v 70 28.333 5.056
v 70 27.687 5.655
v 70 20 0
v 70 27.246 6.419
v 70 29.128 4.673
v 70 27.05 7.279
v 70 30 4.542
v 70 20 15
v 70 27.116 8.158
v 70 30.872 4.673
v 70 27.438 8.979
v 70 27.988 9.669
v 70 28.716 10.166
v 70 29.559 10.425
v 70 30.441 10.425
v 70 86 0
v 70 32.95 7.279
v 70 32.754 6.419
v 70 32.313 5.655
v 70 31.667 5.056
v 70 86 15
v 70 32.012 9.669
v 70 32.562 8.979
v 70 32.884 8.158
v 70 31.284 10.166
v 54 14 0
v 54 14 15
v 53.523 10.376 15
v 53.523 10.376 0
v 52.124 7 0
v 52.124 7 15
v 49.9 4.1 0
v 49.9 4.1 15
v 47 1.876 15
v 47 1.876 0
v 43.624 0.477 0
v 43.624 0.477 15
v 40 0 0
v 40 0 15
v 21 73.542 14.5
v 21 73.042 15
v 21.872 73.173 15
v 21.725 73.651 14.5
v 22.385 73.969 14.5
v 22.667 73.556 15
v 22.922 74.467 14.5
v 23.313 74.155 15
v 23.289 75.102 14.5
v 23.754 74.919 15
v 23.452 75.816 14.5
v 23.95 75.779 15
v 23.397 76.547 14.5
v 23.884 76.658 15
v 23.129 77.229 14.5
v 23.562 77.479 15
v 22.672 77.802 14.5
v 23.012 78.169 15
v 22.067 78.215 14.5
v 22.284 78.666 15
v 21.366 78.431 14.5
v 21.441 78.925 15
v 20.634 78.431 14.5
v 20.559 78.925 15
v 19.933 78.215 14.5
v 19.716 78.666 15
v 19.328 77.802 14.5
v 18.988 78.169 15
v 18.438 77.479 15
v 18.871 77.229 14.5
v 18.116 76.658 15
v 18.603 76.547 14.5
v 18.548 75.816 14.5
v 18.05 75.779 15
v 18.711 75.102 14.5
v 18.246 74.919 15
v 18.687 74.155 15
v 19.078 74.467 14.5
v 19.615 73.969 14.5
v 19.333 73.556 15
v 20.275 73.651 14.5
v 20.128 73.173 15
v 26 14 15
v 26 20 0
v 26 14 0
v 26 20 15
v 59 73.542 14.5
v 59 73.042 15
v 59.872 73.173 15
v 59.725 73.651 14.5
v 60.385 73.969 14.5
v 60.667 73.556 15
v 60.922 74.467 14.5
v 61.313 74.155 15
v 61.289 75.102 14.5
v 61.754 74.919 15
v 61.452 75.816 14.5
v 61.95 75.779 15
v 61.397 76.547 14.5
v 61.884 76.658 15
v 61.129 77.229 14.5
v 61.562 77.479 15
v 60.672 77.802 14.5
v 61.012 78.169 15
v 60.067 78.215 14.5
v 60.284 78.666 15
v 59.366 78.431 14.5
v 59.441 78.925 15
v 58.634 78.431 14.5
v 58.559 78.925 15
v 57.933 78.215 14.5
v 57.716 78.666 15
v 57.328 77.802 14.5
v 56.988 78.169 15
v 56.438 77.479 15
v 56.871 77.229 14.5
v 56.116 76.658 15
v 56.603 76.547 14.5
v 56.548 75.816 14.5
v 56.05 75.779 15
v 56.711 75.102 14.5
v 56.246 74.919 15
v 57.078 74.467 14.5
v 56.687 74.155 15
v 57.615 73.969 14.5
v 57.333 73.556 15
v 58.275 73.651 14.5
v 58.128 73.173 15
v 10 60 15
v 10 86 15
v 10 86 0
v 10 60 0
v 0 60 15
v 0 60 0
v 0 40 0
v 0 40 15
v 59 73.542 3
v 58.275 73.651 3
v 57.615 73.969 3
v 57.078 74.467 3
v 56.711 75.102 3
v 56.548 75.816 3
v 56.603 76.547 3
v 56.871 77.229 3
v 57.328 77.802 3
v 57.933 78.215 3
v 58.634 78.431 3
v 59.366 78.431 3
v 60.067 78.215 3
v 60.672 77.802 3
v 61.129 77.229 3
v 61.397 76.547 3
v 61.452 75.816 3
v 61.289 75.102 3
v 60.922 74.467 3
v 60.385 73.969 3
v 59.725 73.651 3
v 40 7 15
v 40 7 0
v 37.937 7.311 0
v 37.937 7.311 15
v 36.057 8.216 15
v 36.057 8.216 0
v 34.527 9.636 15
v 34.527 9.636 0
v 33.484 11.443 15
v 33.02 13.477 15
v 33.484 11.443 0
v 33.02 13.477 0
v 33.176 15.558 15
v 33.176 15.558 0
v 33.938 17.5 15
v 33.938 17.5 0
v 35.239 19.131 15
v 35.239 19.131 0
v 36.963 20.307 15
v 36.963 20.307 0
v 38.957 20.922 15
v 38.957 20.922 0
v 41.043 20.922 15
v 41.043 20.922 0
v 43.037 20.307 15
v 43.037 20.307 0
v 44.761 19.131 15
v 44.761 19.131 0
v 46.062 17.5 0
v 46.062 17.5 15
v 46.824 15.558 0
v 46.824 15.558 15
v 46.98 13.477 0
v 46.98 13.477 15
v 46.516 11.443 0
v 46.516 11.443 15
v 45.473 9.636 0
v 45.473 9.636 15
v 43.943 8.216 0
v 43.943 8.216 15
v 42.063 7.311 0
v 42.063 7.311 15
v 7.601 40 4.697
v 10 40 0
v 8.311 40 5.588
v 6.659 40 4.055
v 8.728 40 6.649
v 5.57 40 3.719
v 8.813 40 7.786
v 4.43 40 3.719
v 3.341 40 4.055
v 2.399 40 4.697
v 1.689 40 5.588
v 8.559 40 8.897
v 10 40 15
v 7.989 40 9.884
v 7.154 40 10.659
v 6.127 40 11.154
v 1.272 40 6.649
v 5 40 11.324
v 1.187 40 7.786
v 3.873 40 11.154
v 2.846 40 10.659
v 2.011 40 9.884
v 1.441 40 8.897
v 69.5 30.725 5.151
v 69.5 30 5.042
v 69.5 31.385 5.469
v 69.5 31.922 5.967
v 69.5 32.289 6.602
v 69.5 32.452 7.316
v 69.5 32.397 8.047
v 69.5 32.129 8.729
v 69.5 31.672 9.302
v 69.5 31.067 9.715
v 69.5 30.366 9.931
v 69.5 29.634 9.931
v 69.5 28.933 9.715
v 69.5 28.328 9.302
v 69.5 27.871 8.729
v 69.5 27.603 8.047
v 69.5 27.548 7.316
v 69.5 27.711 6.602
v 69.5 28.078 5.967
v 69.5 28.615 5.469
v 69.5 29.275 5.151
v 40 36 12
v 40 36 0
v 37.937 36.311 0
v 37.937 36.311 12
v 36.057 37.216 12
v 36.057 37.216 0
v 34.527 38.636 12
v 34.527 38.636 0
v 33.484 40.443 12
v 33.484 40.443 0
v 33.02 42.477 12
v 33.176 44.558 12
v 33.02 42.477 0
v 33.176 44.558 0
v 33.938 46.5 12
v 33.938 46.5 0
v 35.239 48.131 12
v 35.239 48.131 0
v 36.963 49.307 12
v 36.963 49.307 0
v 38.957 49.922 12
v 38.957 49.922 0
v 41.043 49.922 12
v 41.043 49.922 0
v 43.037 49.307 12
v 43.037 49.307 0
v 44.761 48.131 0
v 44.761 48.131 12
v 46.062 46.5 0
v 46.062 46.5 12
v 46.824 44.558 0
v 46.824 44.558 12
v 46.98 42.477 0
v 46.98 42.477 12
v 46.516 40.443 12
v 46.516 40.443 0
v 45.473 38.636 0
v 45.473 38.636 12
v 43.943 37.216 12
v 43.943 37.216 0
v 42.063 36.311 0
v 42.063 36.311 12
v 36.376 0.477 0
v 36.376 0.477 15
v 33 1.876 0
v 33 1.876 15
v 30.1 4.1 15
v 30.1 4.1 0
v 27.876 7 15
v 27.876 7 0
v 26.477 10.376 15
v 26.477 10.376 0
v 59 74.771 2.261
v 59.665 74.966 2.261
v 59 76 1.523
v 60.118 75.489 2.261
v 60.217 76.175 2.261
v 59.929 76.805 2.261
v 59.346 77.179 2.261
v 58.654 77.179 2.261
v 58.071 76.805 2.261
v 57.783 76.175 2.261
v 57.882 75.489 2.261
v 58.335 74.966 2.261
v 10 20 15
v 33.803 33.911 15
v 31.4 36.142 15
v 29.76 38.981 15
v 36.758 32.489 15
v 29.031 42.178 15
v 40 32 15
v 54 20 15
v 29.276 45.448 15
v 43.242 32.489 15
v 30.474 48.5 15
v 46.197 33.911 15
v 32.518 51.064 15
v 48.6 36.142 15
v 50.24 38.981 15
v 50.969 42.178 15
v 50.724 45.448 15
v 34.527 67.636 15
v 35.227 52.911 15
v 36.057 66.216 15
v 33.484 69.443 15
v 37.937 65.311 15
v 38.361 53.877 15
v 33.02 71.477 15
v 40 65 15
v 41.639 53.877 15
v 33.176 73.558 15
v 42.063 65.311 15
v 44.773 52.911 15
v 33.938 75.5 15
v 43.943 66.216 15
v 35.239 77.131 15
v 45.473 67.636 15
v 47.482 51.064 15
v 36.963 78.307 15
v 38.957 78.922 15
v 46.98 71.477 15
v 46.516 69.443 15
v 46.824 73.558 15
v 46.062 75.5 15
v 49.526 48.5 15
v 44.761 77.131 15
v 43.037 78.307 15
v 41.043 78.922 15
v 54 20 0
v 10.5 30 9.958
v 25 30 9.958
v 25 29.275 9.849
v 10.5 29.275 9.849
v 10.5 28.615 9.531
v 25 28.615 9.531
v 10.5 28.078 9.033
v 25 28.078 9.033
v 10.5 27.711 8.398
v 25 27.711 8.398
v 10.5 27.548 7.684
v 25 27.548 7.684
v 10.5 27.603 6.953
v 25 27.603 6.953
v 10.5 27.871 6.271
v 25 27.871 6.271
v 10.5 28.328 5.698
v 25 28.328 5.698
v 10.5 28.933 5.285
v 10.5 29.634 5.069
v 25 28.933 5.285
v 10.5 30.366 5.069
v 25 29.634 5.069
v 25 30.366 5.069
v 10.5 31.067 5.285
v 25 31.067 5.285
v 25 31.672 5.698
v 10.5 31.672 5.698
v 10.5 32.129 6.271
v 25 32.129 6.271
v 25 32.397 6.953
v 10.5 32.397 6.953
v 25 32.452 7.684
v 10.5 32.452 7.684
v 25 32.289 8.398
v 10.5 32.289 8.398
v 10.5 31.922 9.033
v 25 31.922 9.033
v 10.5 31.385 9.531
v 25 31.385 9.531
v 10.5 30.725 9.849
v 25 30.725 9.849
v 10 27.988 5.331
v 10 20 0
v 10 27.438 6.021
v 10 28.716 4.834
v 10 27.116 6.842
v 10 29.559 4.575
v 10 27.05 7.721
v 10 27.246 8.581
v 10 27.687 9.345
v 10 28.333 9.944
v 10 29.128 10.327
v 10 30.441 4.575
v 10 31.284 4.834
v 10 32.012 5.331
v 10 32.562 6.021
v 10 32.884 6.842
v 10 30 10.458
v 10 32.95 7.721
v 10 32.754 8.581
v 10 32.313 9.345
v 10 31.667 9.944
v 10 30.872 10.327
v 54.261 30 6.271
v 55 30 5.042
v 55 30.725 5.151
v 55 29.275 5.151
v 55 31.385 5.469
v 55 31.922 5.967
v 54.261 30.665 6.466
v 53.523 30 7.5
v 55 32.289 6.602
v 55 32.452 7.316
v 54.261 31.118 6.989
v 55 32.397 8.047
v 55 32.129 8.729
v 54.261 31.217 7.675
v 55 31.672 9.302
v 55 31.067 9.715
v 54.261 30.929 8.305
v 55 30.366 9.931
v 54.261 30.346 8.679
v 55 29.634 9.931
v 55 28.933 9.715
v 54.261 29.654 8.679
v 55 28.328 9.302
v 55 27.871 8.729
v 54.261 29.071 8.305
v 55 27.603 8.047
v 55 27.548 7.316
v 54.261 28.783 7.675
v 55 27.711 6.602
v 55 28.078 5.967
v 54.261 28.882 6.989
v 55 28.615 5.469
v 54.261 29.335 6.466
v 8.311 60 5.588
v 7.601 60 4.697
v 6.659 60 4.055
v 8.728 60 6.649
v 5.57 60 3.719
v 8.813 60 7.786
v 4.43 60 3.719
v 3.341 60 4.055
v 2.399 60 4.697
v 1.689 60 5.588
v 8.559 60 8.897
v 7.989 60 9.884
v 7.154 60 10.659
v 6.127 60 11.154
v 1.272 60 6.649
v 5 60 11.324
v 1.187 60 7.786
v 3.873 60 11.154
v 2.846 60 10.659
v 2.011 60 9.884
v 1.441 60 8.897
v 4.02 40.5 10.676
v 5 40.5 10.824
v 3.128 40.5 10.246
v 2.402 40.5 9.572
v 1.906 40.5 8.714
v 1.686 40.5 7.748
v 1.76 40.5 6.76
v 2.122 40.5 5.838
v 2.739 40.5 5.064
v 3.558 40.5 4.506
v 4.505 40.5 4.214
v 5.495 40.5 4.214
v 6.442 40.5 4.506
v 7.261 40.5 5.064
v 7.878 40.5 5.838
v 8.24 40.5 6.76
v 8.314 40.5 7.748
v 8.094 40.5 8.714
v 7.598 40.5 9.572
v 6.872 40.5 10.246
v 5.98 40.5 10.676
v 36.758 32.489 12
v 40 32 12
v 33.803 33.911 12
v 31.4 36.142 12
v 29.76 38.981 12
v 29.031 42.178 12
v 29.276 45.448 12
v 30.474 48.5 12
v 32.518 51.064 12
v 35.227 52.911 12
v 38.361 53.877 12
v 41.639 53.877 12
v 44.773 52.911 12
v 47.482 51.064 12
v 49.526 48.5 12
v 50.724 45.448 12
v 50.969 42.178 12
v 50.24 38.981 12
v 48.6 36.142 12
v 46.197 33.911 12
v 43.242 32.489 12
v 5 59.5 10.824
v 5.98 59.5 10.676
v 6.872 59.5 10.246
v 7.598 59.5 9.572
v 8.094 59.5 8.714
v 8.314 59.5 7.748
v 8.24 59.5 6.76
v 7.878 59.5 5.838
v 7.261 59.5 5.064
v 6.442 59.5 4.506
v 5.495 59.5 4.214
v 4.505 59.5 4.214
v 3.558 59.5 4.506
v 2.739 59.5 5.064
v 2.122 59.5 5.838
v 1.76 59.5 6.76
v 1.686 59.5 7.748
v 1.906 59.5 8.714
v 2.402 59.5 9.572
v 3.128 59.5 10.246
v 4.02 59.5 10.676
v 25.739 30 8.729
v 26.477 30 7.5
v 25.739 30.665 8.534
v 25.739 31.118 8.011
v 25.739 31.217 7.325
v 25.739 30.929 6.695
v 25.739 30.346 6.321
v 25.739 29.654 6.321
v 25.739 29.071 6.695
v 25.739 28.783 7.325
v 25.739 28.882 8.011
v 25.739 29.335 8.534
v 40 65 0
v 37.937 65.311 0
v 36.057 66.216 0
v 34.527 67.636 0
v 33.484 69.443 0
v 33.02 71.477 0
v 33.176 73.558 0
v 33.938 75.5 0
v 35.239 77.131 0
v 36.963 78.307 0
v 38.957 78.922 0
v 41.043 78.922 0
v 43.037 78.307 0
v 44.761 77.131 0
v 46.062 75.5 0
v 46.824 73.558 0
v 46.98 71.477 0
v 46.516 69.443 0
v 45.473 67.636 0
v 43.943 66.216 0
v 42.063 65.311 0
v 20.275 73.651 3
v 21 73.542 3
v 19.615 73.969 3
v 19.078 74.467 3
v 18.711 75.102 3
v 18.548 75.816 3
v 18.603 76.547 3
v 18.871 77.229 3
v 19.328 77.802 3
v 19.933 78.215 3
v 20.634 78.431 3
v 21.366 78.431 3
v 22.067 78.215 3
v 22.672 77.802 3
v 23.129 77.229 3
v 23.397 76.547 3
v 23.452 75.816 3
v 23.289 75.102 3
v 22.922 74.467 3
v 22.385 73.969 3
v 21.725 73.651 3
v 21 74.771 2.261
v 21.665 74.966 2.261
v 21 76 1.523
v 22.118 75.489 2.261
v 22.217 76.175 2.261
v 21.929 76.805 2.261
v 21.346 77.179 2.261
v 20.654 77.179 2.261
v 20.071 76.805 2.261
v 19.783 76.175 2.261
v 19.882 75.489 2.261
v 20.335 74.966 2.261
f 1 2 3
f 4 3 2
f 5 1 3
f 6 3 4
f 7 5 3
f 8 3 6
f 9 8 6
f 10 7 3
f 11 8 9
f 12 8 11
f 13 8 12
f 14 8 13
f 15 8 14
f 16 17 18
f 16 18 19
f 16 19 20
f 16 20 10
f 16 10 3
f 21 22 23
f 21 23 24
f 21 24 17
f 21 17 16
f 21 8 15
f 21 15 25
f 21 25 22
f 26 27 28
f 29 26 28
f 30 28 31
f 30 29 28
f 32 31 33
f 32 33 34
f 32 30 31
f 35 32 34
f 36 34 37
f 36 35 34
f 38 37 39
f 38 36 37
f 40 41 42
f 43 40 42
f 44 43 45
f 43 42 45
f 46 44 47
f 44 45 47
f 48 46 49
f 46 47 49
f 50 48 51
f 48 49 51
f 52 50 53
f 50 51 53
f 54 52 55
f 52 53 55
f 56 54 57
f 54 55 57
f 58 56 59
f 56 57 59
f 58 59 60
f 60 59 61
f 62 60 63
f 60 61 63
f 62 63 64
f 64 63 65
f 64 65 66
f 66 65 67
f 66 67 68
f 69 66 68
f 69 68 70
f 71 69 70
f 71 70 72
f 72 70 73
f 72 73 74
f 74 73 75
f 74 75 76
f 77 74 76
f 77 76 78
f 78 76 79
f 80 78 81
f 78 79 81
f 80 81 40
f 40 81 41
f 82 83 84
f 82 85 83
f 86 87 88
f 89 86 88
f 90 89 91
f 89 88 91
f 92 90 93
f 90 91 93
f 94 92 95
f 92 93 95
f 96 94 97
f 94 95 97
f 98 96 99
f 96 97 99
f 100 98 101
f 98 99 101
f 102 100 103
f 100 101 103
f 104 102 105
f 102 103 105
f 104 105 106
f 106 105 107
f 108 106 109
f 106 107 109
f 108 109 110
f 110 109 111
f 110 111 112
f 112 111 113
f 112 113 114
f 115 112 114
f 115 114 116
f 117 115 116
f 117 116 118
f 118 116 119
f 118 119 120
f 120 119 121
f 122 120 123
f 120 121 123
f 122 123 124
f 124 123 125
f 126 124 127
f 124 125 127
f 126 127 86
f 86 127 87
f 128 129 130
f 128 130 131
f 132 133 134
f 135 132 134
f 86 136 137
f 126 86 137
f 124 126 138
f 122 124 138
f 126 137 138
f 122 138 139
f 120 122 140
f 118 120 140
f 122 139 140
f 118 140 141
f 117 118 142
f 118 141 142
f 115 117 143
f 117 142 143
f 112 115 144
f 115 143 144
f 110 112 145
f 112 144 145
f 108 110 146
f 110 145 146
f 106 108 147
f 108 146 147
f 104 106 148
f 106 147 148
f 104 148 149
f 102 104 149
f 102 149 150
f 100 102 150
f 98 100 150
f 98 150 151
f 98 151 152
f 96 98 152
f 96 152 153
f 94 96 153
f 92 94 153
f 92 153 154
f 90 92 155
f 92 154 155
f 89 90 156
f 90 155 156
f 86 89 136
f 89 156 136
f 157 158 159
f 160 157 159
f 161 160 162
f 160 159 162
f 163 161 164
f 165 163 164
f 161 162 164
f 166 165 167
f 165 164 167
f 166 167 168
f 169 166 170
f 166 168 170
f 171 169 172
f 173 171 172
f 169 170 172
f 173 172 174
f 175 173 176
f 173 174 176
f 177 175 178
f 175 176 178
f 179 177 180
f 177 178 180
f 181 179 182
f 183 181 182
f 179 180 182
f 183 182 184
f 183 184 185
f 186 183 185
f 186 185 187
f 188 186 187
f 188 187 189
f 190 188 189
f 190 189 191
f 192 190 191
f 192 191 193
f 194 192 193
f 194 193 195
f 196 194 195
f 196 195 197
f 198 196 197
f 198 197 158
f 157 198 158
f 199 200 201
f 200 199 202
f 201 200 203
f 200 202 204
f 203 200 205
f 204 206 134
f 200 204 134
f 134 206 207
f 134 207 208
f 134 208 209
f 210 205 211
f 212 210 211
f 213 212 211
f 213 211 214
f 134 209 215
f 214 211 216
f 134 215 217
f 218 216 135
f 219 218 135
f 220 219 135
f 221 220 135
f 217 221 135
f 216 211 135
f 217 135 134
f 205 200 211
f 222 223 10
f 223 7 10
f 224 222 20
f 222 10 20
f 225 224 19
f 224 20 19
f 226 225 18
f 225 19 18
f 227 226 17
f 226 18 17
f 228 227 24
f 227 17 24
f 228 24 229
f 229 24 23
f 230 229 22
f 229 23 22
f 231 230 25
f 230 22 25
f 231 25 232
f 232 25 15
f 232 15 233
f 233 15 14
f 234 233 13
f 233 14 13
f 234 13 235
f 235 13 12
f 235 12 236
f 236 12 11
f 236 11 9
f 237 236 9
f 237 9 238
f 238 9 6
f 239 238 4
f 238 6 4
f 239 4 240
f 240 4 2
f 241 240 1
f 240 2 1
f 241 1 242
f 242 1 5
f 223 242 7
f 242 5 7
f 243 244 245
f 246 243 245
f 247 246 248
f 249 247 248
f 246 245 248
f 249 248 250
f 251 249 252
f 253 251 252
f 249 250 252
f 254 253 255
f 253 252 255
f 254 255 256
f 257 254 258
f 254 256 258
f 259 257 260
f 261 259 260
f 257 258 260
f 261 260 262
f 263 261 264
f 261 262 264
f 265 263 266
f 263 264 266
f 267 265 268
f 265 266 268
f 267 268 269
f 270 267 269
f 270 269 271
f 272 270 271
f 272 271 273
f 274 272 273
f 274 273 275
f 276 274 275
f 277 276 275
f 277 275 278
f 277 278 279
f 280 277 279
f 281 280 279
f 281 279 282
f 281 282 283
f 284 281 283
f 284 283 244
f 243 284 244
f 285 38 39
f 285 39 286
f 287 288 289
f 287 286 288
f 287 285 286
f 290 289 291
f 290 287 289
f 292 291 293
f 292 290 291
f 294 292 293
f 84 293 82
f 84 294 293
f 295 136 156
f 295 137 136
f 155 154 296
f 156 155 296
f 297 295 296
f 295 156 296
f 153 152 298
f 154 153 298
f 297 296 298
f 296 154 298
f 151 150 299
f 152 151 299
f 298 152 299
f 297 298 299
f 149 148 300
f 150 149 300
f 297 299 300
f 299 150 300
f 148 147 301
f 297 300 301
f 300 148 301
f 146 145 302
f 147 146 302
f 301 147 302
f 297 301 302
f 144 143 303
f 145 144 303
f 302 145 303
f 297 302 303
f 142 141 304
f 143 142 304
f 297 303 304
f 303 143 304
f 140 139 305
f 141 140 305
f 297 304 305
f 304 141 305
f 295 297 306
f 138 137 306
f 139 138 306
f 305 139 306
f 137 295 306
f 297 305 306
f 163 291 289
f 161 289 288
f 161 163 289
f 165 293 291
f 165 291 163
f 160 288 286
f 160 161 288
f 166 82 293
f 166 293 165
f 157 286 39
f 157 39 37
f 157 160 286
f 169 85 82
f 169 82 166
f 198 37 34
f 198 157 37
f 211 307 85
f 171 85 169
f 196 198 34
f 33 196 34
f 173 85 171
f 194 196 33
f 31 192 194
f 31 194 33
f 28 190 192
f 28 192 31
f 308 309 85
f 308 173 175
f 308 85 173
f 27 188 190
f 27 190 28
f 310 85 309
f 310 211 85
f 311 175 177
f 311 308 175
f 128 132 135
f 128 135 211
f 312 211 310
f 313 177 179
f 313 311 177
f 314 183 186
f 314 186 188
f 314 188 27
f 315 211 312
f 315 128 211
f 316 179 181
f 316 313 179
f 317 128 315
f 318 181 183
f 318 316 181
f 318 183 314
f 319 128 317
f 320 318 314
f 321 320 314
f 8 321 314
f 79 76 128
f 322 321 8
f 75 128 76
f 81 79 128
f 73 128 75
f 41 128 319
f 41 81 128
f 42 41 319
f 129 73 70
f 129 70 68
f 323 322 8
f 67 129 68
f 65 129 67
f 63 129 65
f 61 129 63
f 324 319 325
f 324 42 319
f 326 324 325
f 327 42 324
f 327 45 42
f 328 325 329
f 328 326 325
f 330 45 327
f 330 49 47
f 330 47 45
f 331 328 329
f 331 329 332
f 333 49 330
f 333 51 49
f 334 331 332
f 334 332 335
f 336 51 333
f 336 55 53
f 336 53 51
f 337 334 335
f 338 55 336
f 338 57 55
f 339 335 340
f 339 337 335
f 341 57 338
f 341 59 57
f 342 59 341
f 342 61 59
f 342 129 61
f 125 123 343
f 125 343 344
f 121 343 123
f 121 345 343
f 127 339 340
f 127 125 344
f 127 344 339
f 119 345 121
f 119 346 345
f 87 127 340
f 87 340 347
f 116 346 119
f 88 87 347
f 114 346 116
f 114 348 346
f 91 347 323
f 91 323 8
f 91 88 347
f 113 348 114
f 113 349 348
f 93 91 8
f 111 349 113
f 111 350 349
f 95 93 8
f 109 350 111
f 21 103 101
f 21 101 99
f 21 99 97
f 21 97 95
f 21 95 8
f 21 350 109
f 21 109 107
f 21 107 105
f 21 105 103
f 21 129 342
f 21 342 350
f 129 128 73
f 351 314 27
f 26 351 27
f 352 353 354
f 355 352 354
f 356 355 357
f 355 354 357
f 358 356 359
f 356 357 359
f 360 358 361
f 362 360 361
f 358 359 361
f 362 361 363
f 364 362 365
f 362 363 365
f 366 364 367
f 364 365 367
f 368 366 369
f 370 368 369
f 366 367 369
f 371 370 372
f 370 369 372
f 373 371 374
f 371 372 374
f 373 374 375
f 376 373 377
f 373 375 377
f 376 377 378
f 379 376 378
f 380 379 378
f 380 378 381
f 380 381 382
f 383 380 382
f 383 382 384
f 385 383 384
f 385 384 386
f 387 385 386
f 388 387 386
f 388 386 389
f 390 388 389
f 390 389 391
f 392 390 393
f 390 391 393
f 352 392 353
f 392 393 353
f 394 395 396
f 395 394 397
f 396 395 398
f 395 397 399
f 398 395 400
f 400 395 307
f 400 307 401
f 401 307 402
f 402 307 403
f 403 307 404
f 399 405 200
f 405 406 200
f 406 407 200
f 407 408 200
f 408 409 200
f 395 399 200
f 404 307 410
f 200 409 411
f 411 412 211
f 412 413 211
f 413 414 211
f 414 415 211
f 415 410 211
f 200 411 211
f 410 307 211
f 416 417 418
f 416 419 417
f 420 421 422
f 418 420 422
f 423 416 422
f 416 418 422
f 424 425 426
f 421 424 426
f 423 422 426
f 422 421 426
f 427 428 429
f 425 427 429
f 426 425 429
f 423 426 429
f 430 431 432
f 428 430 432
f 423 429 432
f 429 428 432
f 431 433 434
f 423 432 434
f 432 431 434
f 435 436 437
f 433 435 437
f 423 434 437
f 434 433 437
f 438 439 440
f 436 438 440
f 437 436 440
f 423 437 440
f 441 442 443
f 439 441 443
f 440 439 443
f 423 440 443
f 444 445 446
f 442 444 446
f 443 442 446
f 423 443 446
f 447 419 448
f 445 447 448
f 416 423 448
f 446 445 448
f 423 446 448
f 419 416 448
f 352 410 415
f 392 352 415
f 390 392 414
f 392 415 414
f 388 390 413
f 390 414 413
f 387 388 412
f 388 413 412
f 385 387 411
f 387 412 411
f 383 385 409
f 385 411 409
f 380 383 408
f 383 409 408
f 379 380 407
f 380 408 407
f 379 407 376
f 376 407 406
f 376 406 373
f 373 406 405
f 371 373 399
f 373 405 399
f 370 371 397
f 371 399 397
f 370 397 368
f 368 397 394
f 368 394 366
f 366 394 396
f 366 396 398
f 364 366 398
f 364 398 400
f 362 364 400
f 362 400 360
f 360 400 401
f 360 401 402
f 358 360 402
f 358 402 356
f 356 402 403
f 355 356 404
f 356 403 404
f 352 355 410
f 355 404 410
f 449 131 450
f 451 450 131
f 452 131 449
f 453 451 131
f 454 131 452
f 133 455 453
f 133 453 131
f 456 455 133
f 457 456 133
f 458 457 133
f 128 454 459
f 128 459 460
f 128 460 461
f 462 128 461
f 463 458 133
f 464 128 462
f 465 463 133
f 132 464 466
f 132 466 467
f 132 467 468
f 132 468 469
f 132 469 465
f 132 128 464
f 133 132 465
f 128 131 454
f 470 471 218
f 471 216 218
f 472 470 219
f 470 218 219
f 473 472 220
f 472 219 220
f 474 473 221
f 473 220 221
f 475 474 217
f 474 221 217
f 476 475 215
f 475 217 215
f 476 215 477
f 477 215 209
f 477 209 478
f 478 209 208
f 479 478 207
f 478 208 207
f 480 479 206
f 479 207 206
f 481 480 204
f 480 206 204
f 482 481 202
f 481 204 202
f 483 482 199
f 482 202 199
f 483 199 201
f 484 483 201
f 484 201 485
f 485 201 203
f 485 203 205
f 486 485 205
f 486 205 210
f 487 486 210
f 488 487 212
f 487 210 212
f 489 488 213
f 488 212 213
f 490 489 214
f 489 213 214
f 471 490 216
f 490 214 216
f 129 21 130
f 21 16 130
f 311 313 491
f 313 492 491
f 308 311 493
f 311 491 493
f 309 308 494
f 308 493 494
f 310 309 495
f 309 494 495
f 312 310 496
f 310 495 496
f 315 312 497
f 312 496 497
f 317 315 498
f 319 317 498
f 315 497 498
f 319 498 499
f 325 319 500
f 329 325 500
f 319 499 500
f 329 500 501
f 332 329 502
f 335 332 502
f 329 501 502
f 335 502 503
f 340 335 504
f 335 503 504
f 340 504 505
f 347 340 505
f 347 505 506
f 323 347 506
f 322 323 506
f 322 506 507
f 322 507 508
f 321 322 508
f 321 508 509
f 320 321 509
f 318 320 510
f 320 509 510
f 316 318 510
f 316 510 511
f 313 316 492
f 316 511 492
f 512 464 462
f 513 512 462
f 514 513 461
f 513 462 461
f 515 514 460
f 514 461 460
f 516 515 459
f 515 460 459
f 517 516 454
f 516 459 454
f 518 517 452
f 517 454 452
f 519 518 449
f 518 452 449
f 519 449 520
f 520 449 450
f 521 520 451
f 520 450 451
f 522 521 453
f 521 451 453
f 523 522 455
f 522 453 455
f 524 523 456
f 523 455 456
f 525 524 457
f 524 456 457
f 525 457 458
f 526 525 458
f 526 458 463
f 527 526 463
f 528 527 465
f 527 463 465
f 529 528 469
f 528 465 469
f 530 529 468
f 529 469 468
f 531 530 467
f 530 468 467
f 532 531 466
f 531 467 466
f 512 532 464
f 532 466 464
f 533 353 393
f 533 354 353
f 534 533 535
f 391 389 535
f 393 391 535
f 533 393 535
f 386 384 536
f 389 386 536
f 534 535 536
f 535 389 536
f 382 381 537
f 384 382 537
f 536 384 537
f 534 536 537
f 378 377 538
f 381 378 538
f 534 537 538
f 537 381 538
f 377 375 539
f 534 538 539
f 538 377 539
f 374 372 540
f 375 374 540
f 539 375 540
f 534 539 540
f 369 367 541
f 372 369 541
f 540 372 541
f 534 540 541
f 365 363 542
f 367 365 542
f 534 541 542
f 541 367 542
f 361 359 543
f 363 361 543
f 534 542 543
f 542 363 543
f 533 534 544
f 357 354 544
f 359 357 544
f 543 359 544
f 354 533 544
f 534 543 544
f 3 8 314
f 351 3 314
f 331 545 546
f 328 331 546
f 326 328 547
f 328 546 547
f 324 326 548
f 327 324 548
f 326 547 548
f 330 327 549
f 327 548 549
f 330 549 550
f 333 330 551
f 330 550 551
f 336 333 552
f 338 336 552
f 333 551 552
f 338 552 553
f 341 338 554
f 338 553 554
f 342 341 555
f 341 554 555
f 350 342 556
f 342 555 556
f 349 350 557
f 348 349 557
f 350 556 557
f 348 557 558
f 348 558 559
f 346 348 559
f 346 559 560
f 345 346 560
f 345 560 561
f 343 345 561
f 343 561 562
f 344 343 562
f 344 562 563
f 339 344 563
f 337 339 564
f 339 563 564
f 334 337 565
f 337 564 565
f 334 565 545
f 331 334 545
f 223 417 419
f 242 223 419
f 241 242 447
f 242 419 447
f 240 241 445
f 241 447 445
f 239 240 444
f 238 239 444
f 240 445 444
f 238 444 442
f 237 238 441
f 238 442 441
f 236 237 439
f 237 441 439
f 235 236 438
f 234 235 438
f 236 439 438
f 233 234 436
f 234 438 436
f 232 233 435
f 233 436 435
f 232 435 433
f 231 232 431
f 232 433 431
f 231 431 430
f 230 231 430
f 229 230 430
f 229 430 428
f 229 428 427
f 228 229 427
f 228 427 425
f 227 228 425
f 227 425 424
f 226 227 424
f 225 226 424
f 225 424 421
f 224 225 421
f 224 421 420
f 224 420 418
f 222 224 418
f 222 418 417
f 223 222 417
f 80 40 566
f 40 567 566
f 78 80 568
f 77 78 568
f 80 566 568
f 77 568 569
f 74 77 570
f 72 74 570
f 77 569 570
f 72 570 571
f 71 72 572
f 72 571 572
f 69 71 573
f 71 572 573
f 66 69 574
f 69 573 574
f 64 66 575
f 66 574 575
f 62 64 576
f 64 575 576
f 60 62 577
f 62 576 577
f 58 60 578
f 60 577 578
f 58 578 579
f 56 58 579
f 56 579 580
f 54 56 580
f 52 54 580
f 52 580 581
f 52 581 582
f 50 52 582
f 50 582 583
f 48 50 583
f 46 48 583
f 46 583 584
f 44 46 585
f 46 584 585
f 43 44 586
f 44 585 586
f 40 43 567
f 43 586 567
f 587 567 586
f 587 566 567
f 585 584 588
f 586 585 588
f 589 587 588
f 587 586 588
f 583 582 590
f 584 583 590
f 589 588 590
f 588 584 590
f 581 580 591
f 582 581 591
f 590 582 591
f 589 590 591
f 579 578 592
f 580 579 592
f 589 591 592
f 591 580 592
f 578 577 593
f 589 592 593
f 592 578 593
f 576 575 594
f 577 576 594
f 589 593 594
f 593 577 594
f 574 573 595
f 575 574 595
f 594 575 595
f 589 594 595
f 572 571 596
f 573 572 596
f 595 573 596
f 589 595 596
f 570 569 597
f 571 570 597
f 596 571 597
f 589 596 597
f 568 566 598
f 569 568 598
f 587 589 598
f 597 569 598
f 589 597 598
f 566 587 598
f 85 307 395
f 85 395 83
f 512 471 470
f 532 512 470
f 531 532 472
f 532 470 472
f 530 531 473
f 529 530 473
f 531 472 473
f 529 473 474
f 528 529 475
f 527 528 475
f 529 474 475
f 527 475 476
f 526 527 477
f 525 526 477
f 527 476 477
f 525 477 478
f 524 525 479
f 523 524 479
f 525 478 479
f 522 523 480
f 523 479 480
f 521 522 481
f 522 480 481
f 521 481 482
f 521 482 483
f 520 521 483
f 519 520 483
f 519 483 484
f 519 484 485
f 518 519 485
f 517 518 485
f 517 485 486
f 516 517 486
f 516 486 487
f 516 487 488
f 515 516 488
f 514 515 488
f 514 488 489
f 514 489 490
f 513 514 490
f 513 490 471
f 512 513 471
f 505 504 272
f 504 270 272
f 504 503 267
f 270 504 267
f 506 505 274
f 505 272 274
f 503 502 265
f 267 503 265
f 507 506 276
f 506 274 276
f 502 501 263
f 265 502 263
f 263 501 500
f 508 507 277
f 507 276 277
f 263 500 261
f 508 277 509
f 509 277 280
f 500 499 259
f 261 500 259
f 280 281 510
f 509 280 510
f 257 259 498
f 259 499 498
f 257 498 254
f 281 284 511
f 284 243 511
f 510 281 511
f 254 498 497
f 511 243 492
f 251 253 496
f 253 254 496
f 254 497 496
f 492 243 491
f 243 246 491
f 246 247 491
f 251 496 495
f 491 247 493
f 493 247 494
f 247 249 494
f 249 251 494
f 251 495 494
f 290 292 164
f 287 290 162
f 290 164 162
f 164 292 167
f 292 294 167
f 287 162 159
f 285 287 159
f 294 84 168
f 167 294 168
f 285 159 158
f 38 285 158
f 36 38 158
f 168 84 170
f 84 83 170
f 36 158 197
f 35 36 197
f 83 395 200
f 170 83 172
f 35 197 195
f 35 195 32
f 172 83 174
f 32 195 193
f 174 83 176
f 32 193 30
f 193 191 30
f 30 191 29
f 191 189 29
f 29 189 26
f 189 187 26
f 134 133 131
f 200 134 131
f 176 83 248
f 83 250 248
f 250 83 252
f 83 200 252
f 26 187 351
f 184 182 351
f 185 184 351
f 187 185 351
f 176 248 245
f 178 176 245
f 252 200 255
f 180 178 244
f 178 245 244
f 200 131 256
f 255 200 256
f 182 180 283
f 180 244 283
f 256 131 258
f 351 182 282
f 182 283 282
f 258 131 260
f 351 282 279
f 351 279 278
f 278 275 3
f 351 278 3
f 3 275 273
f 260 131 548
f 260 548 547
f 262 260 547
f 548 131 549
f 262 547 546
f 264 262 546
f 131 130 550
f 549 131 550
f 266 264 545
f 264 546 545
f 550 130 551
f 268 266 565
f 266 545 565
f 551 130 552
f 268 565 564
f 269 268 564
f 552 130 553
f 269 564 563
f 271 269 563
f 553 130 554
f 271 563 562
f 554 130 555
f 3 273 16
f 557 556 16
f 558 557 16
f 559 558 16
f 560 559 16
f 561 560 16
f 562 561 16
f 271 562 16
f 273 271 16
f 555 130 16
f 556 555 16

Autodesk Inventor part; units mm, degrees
ref_plane "YZ Plane" through (0, 0, 0) normal (1, 0, 0) x (0, 1, 0)
ref_plane "XZ Plane" through (0, 0, 0) normal (0, 1, 0) x (-1, 0, 0)
ref_plane "XY Plane" through (0, 0, 0) normal (0, 0, 1) x (1, 0, 0)
sketch "Sketch1" plane through (0, 0, 0) normal (0, 0, 1) x (1, 0, 0)
  line L0 (0, 0) -> (80, 0)
  line L1 (80, 0) -> (80, 86)
  line L2 (80, 86) -> (0, 86)
  line L3 (0, 86) -> (0, 0)
  dimension "d0" = 80
  dimension "d1" = 86
extrude "Extrusion1" add sketch "Sketch1" along normal blind 15
sketch "Sketch2" plane through (0, 0, 15) normal (0, 0, 1) x (1, 0, 0)
  line L0 (0, 0) -> (0, 86) projected
  line L1 (80, 0) -> (0, 0) projected
  line L2 (80, 86) -> (80, 0) projected
  line L3 (0, 86) -> (80, 86) projected
  line L4 (0, 86) -> (10, 86)
  line L5 (10, 86) -> (10, 60)
  line L6 (10, 60) -> (0, 60)
  line L7 (0, 60) -> (0, 86)
  line L8 (70, 86) -> (80, 86)
  line L9 (80, 86) -> (80, 40)
  line L10 (80, 40) -> (70, 40)
  line L11 (70, 40) -> (70, 86)
  line L12 (54, 0) -> (80, 0)
  line L13 (80, 0) -> (80, 20)
  line L14 (80, 20) -> (54, 20)
  line L15 (54, 20) -> (54, 0)
  line L16 (0, 20) -> (26, 20)
  line L17 (26, 20) -> (26, 0)
  line L18 (26, 0) -> (0, 0)
  line L19 (0, 0) -> (0, 20)
  dimension "d4" = 20
  dimension "d5" = 20
  dimension "d6" = 20
  dimension "d7" = 10
  dimension "d8" = 10
  dimension "d9" = 40
  dimension "d10" = 28
  dimension "d11" = 26
extrude "Extrusion2" cut sketch "Sketch2" against normal blind 15 contours L0 L16 L17 L1 | L0 L3 L5 L6 | L15 L14 L2 L1 | L3 L2 L10 L11
sketch "Sketch3" plane through (0, 0, 15) normal (0, 0, 1) x (1, 0, 0)
  line L0 (10, 86) -> (10, 60) projected
  line L1 (10, 60) -> (0, 60) projected
  line L2 (0, 20) -> (0, 60) projected
  line L3 (0, 20) -> (26, 20) projected
  line L4 (26, 20) -> (26, 0) projected
  line L5 (54, 0) -> (26, 0) projected
  line L6 (54, 0) -> (54, 20) projected
  line L7 (54, 20) -> (80, 20) projected
  line L8 (80, 40) -> (80, 20) projected
  line L9 (80, 40) -> (70, 40) projected
  line L10 (70, 40) -> (70, 86) projected
  line L11 (10, 86) -> (70, 86) projected
  line L12 (0, 20) -> (10, 20)
  line L13 (10, 20) -> (10, 40)
  line L14 (10, 40) -> (0, 40)
  line L15 (0, 40) -> (0, 20)
  point P0 (0, 0)
  dimension "d14" = 10
  dimension "d15" = 20
extrude "Extrusion3" cut sketch "Sketch3" against normal blind 15 contours L14 L13 L3 L2
sketch "Sketch4" plane through (0, 0, 15) normal (0, 0, 1) x (1, 0, 0)
  line L0 (26, 20) -> (26, 0) projected
  line L1 (54, 0) -> (26, 0) projected
  line L2 (10, 86) -> (70, 86) projected
  line L3 (0, 40) -> (0, 60) projected
  point P0 (0, 0)
  point P1 (40, 72)
  point P2 (40, 14)
  dimension "d18" = 14
  dimension "d19" = 40
  dimension "d20" = 14
  dimension "d21" = 14
hole "Hole1" at (40, 72, 15) at (40, 14, 15) direction (0, 0, -1) diameter 14 depth 15 tip angle 118
sketch "Sketch5" plane through (0, 0, 15) normal (0, 0, 1) x (1, 0, 0)
  circle A0 centre (40, 72) radius 7 projected
  line L0 (0, 40) -> (0, 60) projected
  point P0 (0, 0)
  point P1 (40, 43)
  dimension "d29" = 29
  dimension "d30" = 40
hole "Hole2" at (40, 43, 15) direction (0, 0, -1) diameter 14 depth 18 tip angle 118 counterbore diameter 22 counterbore depth 3
fillet "Fillet1" radius 14 2 edges at (26, 0, 7.5) (54, 0, 7.5)
sketch "Sketch6" plane through (0, 0, 15) normal (0, 0, 1) x (1, 0, 0)
  line L0 (70, 40) -> (80, 40)
  line L1 (80, 40) -> (80, 20)
  line L2 (80, 20) -> (70, 20)
  line L3 (70, 20) -> (70, 40)
  point P0 (0, 0)
extrude "Extrusion4" cut sketch "Sketch6" against normal blind 15
sketch "Sketch7" plane through (0, 60, 15) normal (0, 1, 0) x (1, 0, 0)
  line L0 (0, 15) -> (10, 15) projected
  line L1 (10, 0) -> (10, 15) projected
  point P0 (5, 7.5)
  dimension "d41" = 7.5
  dimension "d42" = 5
hole "Hole3" at (5, 60, 7.5) direction (0, -1, 0) diameter 6.647 depth 20 tip angle 118 thread size "M8x1.25" class "6H" standard "ANSI Metric M Profile"
chamfer "Chamfer1" distance 0.5 angle 45 2 edges at (5, 60, 4.1765) (5, 40, 4.1765)
sketch "Sketch8" plane through (0, 0, 15) normal (0, 0, 1) x (1, 0, 0)
  circle A0 centre (40, 72) radius 7 projected
  line L0 (10, 86) -> (70, 86) projected
  point P0 (0, 0)
  point P1 (21, 76)
  point P2 (59, 76)
  dimension "d53" = 38
  dimension "d54" = 19
  dimension "d55" = 10
hole "Hole4" at (21, 76, 15) at (59, 76, 15) direction (0, 0, -1) diameter 4.917 depth 12 tip angle 118 thread size "M6x1" class "6H" standard "ANSI Metric M Profile"
chamfer "Chamfer2" distance 0.5 angle 45 2 edges at (21, 78.4585, 15) (59, 78.4585, 15)
sketch "Sketch9" plane through (70, 20, 15) normal (1, 0, 0) x (0, 0, -1)
  line L0 (15, 66) -> (15, 0) projected
  line L1 (0, 66) -> (15, 66) projected
  point P0 (15, -20)
  point P1 (7.5, 10)
  dimension "d66" = 7.5
  dimension "d67" = 56
hole "Hole5" at (70, 30, 7.5) direction (-1, 0, 0) diameter 4.917 depth 15 tip angle 118 thread size "M6x1" class "6H" standard "ANSI Metric M Profile"
chamfer "Chamfer3" distance 0.5 angle 45 1 edges at (70, 30, 9.9585)
sketch "Sketch10" plane through (10, 20, 15) normal (-1, 0, 0) x (0, 0, 1)
  line L0 (-15, 0) -> (-15, 20) projected
  line L1 (0, 0) -> (-15, 0) projected
  point P0 (-15, -20)
  point P1 (-7.5, 10)
  dimension "d78" = 10
  dimension "d79" = 7.5
hole "Hole6" at (10, 30, 7.5) direction (1, 0, 0) diameter 4.917 depth 15 tip angle 118 thread size "M6x1" class "6H" standard "ANSI Metric M Profile"
chamfer "Chamfer4" distance 0.5 angle 45 1 edges at (10, 30, 5.0415)
properties part number "PLACA COM FUROS COORDENADOS(13)" material "Carbon Steel"
